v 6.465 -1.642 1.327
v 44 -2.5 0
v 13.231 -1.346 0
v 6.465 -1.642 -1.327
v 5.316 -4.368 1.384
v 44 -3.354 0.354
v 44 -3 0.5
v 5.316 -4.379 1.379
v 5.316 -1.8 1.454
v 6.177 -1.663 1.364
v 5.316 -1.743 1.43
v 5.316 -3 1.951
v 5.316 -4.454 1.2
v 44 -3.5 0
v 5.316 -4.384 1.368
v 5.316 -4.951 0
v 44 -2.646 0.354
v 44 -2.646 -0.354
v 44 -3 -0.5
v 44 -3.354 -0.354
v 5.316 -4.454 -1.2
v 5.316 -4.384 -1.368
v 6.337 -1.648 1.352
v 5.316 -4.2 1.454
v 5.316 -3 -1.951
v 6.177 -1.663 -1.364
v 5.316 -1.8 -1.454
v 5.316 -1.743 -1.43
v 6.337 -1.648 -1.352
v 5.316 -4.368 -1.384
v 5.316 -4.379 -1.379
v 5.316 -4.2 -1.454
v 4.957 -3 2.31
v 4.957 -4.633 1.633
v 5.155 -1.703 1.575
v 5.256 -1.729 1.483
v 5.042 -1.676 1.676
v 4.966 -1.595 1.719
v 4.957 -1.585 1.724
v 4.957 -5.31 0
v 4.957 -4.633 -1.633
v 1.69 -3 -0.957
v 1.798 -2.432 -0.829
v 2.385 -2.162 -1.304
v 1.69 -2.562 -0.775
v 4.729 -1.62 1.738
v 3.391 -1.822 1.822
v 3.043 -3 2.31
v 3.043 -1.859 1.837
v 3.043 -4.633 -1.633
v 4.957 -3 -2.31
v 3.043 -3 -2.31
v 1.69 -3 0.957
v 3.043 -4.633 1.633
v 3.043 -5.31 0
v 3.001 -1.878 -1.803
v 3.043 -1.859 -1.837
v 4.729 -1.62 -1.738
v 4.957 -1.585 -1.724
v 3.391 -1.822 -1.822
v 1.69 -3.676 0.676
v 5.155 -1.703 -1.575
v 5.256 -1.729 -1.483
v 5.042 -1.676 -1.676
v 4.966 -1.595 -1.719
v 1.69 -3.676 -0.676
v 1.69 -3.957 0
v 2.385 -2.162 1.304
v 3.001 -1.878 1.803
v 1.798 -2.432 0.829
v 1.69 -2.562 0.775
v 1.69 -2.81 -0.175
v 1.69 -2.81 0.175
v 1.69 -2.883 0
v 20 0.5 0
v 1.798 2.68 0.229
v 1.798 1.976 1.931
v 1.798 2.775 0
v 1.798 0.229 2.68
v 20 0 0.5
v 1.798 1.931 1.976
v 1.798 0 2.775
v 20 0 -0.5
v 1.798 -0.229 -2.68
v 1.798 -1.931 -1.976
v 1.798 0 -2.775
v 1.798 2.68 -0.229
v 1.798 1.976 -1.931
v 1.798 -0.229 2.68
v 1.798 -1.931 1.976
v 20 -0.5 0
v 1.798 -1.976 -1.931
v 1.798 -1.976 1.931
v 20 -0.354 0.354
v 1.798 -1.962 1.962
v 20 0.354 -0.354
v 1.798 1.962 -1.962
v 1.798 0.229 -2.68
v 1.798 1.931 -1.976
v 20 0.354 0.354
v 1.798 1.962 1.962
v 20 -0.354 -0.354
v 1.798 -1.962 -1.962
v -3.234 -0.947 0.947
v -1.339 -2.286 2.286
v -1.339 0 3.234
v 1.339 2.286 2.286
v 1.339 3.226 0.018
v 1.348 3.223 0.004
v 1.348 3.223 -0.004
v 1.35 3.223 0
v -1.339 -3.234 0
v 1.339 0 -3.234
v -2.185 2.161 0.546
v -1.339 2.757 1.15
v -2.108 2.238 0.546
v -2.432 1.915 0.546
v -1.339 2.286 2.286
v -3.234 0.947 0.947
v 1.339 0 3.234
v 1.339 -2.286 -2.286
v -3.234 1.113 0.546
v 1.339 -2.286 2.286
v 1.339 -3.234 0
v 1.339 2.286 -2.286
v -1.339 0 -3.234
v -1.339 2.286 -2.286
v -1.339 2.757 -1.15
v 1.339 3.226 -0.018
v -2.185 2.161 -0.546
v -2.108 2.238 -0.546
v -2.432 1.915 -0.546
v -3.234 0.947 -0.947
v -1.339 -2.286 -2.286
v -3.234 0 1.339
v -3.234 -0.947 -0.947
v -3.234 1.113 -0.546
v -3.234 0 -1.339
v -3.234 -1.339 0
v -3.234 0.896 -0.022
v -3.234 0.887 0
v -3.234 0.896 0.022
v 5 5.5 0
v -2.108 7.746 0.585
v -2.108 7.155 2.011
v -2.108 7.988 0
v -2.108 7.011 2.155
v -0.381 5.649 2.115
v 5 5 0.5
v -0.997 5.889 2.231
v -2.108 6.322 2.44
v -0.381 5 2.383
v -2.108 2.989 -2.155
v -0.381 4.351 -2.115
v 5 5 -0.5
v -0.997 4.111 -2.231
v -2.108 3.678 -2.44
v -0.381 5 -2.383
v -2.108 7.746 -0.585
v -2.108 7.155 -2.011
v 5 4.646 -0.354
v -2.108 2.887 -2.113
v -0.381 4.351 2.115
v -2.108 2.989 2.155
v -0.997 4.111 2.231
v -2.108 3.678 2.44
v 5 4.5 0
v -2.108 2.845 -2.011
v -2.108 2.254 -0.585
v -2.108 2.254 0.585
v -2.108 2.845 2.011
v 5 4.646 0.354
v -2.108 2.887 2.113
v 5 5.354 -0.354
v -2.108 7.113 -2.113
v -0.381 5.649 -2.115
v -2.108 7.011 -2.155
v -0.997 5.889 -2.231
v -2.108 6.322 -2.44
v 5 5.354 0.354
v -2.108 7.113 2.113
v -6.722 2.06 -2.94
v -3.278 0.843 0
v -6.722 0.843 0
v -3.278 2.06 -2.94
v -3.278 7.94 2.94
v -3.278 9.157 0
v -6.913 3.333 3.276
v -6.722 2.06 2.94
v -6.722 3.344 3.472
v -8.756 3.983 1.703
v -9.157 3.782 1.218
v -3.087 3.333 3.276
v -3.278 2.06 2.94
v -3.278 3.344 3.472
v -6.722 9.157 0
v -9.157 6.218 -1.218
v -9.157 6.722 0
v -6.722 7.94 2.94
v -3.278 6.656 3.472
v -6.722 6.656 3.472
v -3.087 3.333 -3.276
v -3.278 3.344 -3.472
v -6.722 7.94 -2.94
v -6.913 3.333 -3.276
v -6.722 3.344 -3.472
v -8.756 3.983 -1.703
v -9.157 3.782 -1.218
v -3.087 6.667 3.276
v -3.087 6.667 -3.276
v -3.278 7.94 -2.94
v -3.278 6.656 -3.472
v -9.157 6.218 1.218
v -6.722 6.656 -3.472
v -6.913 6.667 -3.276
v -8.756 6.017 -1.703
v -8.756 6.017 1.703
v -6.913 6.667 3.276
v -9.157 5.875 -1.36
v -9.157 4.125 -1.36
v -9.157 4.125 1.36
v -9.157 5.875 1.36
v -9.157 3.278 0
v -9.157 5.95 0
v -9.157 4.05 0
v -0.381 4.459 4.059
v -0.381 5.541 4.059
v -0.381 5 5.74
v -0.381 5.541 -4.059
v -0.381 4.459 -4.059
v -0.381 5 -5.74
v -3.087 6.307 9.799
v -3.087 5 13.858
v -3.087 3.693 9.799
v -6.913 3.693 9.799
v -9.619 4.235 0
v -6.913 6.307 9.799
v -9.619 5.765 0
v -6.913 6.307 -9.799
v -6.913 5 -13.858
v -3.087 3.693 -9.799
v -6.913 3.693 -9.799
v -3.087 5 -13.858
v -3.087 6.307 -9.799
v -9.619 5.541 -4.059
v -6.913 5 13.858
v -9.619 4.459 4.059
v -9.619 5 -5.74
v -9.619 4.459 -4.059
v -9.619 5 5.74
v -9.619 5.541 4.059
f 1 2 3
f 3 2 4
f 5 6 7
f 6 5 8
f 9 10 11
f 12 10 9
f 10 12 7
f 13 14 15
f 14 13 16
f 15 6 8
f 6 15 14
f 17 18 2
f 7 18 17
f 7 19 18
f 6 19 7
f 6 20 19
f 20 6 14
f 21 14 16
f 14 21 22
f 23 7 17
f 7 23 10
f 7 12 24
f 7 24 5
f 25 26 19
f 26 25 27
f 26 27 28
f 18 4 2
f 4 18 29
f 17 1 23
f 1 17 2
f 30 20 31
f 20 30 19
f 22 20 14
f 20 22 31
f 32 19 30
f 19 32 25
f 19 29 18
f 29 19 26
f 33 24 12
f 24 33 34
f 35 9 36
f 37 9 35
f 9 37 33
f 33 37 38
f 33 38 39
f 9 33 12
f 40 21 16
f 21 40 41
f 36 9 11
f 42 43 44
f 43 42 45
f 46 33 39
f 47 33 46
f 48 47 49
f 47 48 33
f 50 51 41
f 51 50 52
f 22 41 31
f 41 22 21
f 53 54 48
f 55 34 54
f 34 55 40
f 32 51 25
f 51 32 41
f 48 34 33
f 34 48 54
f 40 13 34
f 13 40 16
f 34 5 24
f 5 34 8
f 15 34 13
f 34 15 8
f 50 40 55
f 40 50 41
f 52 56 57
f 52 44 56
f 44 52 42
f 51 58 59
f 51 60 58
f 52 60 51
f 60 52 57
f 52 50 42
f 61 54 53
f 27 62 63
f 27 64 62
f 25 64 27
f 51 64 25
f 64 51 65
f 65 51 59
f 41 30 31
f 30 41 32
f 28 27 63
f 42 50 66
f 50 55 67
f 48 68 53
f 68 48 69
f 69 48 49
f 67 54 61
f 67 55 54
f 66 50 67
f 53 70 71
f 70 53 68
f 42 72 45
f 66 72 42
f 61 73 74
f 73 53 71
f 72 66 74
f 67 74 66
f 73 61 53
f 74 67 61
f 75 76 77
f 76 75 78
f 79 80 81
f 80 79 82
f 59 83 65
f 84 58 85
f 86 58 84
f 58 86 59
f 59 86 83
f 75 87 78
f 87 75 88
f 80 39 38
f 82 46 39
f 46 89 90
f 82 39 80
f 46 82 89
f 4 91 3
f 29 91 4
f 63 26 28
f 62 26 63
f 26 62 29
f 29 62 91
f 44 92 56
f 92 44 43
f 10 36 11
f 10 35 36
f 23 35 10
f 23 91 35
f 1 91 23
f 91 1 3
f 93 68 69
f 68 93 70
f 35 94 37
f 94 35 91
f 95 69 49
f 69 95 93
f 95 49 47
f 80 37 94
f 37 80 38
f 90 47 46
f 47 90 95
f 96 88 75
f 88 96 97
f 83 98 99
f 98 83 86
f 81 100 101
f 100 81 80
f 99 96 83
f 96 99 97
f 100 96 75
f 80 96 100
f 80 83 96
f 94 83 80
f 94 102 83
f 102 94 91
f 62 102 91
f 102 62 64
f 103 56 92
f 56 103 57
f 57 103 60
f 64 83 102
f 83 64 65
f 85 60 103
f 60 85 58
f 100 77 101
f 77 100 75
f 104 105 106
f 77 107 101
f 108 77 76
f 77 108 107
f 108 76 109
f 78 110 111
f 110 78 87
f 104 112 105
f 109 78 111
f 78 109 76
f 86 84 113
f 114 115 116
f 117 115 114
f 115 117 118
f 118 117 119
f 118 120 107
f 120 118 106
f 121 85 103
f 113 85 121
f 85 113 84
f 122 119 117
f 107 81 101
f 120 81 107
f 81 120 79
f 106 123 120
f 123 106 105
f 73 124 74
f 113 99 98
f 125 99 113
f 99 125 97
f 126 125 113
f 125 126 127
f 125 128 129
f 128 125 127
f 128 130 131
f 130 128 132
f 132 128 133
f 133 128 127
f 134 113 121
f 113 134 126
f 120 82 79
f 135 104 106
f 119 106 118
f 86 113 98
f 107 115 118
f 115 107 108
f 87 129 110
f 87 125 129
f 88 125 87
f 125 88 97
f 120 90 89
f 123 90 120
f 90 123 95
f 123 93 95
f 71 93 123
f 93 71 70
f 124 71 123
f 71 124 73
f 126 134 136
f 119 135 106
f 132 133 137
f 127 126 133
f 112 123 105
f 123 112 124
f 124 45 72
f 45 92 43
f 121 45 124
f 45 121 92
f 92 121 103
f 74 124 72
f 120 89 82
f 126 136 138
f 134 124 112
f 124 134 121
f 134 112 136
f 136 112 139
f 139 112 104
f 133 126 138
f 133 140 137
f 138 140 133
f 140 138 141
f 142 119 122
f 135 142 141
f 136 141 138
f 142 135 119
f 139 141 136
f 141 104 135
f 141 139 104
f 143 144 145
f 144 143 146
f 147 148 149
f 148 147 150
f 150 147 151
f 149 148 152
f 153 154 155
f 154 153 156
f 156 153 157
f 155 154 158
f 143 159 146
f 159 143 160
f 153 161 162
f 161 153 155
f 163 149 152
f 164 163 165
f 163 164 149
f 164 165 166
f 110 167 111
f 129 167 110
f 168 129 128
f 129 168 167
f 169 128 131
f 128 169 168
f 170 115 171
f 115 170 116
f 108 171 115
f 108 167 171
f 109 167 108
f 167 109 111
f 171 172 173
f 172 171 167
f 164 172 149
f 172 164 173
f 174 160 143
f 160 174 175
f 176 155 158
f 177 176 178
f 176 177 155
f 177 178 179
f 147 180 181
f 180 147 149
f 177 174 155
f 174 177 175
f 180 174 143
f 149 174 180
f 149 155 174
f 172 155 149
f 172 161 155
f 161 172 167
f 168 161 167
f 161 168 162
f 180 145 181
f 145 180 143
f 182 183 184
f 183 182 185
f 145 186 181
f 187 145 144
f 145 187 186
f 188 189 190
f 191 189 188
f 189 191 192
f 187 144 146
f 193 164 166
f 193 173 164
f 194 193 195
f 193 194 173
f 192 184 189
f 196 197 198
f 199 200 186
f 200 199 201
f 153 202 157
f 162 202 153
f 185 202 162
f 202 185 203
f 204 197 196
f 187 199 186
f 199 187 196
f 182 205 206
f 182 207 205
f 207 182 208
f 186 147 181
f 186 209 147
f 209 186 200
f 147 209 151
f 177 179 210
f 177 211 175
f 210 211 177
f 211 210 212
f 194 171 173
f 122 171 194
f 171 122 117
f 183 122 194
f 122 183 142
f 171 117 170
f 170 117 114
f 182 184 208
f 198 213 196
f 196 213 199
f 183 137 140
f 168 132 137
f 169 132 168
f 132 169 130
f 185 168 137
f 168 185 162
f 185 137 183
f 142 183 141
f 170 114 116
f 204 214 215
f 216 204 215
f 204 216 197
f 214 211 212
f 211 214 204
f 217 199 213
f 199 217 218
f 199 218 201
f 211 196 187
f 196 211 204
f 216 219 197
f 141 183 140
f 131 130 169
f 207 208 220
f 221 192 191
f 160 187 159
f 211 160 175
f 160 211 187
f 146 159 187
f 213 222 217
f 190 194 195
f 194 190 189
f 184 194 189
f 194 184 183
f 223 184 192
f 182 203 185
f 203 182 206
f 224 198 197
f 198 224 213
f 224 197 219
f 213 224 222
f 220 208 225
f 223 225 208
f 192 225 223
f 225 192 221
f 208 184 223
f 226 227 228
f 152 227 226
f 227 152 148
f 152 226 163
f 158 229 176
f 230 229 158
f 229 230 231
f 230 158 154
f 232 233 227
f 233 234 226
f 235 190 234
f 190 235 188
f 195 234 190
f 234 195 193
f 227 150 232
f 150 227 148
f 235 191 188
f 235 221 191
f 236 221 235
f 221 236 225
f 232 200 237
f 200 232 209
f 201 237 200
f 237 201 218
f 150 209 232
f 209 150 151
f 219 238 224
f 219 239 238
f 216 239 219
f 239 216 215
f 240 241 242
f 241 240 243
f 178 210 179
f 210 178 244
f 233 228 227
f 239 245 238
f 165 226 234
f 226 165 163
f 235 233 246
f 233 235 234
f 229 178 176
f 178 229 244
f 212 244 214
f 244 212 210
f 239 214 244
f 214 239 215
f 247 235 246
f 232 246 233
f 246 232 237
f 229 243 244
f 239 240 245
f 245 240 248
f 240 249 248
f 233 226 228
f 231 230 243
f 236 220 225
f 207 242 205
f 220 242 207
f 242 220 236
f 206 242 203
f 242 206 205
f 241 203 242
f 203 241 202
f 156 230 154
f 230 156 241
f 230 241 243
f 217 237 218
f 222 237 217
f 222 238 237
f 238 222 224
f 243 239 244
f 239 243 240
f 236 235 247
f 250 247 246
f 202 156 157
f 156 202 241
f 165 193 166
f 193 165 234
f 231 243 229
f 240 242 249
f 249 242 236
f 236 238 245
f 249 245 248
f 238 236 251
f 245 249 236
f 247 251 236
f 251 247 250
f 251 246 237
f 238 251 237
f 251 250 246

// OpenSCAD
module battlestar()
{
	union() {
	translate(v = [5, 0, 0]) {
		cylinder(h = 40, r1 = 2, r2 = 0.5); 
		sphere(r = 2.5);
	}
	translate(v = [8, 0, -4]) {
		cylinder(h = 20, r1 = 3, r2 = 0.5); 
		sphere(r = 3.5);
	}
	translate(v = [13, 0, -9]) {
		cylinder(h = 10, r1 = 4, r2 = 0.5); 
		sphere(r = 4.5);
		scale(v = [0.2, 1.5, 0.5])
		sphere(r = 10);
	}
	}
}

$fn=8;

rotate(a = 90, v = [1, 0, 0])
	rotate(a = 90, v = [0, 1, 0])
		translate(v = [-8, 0, 4])
			battlestar();
